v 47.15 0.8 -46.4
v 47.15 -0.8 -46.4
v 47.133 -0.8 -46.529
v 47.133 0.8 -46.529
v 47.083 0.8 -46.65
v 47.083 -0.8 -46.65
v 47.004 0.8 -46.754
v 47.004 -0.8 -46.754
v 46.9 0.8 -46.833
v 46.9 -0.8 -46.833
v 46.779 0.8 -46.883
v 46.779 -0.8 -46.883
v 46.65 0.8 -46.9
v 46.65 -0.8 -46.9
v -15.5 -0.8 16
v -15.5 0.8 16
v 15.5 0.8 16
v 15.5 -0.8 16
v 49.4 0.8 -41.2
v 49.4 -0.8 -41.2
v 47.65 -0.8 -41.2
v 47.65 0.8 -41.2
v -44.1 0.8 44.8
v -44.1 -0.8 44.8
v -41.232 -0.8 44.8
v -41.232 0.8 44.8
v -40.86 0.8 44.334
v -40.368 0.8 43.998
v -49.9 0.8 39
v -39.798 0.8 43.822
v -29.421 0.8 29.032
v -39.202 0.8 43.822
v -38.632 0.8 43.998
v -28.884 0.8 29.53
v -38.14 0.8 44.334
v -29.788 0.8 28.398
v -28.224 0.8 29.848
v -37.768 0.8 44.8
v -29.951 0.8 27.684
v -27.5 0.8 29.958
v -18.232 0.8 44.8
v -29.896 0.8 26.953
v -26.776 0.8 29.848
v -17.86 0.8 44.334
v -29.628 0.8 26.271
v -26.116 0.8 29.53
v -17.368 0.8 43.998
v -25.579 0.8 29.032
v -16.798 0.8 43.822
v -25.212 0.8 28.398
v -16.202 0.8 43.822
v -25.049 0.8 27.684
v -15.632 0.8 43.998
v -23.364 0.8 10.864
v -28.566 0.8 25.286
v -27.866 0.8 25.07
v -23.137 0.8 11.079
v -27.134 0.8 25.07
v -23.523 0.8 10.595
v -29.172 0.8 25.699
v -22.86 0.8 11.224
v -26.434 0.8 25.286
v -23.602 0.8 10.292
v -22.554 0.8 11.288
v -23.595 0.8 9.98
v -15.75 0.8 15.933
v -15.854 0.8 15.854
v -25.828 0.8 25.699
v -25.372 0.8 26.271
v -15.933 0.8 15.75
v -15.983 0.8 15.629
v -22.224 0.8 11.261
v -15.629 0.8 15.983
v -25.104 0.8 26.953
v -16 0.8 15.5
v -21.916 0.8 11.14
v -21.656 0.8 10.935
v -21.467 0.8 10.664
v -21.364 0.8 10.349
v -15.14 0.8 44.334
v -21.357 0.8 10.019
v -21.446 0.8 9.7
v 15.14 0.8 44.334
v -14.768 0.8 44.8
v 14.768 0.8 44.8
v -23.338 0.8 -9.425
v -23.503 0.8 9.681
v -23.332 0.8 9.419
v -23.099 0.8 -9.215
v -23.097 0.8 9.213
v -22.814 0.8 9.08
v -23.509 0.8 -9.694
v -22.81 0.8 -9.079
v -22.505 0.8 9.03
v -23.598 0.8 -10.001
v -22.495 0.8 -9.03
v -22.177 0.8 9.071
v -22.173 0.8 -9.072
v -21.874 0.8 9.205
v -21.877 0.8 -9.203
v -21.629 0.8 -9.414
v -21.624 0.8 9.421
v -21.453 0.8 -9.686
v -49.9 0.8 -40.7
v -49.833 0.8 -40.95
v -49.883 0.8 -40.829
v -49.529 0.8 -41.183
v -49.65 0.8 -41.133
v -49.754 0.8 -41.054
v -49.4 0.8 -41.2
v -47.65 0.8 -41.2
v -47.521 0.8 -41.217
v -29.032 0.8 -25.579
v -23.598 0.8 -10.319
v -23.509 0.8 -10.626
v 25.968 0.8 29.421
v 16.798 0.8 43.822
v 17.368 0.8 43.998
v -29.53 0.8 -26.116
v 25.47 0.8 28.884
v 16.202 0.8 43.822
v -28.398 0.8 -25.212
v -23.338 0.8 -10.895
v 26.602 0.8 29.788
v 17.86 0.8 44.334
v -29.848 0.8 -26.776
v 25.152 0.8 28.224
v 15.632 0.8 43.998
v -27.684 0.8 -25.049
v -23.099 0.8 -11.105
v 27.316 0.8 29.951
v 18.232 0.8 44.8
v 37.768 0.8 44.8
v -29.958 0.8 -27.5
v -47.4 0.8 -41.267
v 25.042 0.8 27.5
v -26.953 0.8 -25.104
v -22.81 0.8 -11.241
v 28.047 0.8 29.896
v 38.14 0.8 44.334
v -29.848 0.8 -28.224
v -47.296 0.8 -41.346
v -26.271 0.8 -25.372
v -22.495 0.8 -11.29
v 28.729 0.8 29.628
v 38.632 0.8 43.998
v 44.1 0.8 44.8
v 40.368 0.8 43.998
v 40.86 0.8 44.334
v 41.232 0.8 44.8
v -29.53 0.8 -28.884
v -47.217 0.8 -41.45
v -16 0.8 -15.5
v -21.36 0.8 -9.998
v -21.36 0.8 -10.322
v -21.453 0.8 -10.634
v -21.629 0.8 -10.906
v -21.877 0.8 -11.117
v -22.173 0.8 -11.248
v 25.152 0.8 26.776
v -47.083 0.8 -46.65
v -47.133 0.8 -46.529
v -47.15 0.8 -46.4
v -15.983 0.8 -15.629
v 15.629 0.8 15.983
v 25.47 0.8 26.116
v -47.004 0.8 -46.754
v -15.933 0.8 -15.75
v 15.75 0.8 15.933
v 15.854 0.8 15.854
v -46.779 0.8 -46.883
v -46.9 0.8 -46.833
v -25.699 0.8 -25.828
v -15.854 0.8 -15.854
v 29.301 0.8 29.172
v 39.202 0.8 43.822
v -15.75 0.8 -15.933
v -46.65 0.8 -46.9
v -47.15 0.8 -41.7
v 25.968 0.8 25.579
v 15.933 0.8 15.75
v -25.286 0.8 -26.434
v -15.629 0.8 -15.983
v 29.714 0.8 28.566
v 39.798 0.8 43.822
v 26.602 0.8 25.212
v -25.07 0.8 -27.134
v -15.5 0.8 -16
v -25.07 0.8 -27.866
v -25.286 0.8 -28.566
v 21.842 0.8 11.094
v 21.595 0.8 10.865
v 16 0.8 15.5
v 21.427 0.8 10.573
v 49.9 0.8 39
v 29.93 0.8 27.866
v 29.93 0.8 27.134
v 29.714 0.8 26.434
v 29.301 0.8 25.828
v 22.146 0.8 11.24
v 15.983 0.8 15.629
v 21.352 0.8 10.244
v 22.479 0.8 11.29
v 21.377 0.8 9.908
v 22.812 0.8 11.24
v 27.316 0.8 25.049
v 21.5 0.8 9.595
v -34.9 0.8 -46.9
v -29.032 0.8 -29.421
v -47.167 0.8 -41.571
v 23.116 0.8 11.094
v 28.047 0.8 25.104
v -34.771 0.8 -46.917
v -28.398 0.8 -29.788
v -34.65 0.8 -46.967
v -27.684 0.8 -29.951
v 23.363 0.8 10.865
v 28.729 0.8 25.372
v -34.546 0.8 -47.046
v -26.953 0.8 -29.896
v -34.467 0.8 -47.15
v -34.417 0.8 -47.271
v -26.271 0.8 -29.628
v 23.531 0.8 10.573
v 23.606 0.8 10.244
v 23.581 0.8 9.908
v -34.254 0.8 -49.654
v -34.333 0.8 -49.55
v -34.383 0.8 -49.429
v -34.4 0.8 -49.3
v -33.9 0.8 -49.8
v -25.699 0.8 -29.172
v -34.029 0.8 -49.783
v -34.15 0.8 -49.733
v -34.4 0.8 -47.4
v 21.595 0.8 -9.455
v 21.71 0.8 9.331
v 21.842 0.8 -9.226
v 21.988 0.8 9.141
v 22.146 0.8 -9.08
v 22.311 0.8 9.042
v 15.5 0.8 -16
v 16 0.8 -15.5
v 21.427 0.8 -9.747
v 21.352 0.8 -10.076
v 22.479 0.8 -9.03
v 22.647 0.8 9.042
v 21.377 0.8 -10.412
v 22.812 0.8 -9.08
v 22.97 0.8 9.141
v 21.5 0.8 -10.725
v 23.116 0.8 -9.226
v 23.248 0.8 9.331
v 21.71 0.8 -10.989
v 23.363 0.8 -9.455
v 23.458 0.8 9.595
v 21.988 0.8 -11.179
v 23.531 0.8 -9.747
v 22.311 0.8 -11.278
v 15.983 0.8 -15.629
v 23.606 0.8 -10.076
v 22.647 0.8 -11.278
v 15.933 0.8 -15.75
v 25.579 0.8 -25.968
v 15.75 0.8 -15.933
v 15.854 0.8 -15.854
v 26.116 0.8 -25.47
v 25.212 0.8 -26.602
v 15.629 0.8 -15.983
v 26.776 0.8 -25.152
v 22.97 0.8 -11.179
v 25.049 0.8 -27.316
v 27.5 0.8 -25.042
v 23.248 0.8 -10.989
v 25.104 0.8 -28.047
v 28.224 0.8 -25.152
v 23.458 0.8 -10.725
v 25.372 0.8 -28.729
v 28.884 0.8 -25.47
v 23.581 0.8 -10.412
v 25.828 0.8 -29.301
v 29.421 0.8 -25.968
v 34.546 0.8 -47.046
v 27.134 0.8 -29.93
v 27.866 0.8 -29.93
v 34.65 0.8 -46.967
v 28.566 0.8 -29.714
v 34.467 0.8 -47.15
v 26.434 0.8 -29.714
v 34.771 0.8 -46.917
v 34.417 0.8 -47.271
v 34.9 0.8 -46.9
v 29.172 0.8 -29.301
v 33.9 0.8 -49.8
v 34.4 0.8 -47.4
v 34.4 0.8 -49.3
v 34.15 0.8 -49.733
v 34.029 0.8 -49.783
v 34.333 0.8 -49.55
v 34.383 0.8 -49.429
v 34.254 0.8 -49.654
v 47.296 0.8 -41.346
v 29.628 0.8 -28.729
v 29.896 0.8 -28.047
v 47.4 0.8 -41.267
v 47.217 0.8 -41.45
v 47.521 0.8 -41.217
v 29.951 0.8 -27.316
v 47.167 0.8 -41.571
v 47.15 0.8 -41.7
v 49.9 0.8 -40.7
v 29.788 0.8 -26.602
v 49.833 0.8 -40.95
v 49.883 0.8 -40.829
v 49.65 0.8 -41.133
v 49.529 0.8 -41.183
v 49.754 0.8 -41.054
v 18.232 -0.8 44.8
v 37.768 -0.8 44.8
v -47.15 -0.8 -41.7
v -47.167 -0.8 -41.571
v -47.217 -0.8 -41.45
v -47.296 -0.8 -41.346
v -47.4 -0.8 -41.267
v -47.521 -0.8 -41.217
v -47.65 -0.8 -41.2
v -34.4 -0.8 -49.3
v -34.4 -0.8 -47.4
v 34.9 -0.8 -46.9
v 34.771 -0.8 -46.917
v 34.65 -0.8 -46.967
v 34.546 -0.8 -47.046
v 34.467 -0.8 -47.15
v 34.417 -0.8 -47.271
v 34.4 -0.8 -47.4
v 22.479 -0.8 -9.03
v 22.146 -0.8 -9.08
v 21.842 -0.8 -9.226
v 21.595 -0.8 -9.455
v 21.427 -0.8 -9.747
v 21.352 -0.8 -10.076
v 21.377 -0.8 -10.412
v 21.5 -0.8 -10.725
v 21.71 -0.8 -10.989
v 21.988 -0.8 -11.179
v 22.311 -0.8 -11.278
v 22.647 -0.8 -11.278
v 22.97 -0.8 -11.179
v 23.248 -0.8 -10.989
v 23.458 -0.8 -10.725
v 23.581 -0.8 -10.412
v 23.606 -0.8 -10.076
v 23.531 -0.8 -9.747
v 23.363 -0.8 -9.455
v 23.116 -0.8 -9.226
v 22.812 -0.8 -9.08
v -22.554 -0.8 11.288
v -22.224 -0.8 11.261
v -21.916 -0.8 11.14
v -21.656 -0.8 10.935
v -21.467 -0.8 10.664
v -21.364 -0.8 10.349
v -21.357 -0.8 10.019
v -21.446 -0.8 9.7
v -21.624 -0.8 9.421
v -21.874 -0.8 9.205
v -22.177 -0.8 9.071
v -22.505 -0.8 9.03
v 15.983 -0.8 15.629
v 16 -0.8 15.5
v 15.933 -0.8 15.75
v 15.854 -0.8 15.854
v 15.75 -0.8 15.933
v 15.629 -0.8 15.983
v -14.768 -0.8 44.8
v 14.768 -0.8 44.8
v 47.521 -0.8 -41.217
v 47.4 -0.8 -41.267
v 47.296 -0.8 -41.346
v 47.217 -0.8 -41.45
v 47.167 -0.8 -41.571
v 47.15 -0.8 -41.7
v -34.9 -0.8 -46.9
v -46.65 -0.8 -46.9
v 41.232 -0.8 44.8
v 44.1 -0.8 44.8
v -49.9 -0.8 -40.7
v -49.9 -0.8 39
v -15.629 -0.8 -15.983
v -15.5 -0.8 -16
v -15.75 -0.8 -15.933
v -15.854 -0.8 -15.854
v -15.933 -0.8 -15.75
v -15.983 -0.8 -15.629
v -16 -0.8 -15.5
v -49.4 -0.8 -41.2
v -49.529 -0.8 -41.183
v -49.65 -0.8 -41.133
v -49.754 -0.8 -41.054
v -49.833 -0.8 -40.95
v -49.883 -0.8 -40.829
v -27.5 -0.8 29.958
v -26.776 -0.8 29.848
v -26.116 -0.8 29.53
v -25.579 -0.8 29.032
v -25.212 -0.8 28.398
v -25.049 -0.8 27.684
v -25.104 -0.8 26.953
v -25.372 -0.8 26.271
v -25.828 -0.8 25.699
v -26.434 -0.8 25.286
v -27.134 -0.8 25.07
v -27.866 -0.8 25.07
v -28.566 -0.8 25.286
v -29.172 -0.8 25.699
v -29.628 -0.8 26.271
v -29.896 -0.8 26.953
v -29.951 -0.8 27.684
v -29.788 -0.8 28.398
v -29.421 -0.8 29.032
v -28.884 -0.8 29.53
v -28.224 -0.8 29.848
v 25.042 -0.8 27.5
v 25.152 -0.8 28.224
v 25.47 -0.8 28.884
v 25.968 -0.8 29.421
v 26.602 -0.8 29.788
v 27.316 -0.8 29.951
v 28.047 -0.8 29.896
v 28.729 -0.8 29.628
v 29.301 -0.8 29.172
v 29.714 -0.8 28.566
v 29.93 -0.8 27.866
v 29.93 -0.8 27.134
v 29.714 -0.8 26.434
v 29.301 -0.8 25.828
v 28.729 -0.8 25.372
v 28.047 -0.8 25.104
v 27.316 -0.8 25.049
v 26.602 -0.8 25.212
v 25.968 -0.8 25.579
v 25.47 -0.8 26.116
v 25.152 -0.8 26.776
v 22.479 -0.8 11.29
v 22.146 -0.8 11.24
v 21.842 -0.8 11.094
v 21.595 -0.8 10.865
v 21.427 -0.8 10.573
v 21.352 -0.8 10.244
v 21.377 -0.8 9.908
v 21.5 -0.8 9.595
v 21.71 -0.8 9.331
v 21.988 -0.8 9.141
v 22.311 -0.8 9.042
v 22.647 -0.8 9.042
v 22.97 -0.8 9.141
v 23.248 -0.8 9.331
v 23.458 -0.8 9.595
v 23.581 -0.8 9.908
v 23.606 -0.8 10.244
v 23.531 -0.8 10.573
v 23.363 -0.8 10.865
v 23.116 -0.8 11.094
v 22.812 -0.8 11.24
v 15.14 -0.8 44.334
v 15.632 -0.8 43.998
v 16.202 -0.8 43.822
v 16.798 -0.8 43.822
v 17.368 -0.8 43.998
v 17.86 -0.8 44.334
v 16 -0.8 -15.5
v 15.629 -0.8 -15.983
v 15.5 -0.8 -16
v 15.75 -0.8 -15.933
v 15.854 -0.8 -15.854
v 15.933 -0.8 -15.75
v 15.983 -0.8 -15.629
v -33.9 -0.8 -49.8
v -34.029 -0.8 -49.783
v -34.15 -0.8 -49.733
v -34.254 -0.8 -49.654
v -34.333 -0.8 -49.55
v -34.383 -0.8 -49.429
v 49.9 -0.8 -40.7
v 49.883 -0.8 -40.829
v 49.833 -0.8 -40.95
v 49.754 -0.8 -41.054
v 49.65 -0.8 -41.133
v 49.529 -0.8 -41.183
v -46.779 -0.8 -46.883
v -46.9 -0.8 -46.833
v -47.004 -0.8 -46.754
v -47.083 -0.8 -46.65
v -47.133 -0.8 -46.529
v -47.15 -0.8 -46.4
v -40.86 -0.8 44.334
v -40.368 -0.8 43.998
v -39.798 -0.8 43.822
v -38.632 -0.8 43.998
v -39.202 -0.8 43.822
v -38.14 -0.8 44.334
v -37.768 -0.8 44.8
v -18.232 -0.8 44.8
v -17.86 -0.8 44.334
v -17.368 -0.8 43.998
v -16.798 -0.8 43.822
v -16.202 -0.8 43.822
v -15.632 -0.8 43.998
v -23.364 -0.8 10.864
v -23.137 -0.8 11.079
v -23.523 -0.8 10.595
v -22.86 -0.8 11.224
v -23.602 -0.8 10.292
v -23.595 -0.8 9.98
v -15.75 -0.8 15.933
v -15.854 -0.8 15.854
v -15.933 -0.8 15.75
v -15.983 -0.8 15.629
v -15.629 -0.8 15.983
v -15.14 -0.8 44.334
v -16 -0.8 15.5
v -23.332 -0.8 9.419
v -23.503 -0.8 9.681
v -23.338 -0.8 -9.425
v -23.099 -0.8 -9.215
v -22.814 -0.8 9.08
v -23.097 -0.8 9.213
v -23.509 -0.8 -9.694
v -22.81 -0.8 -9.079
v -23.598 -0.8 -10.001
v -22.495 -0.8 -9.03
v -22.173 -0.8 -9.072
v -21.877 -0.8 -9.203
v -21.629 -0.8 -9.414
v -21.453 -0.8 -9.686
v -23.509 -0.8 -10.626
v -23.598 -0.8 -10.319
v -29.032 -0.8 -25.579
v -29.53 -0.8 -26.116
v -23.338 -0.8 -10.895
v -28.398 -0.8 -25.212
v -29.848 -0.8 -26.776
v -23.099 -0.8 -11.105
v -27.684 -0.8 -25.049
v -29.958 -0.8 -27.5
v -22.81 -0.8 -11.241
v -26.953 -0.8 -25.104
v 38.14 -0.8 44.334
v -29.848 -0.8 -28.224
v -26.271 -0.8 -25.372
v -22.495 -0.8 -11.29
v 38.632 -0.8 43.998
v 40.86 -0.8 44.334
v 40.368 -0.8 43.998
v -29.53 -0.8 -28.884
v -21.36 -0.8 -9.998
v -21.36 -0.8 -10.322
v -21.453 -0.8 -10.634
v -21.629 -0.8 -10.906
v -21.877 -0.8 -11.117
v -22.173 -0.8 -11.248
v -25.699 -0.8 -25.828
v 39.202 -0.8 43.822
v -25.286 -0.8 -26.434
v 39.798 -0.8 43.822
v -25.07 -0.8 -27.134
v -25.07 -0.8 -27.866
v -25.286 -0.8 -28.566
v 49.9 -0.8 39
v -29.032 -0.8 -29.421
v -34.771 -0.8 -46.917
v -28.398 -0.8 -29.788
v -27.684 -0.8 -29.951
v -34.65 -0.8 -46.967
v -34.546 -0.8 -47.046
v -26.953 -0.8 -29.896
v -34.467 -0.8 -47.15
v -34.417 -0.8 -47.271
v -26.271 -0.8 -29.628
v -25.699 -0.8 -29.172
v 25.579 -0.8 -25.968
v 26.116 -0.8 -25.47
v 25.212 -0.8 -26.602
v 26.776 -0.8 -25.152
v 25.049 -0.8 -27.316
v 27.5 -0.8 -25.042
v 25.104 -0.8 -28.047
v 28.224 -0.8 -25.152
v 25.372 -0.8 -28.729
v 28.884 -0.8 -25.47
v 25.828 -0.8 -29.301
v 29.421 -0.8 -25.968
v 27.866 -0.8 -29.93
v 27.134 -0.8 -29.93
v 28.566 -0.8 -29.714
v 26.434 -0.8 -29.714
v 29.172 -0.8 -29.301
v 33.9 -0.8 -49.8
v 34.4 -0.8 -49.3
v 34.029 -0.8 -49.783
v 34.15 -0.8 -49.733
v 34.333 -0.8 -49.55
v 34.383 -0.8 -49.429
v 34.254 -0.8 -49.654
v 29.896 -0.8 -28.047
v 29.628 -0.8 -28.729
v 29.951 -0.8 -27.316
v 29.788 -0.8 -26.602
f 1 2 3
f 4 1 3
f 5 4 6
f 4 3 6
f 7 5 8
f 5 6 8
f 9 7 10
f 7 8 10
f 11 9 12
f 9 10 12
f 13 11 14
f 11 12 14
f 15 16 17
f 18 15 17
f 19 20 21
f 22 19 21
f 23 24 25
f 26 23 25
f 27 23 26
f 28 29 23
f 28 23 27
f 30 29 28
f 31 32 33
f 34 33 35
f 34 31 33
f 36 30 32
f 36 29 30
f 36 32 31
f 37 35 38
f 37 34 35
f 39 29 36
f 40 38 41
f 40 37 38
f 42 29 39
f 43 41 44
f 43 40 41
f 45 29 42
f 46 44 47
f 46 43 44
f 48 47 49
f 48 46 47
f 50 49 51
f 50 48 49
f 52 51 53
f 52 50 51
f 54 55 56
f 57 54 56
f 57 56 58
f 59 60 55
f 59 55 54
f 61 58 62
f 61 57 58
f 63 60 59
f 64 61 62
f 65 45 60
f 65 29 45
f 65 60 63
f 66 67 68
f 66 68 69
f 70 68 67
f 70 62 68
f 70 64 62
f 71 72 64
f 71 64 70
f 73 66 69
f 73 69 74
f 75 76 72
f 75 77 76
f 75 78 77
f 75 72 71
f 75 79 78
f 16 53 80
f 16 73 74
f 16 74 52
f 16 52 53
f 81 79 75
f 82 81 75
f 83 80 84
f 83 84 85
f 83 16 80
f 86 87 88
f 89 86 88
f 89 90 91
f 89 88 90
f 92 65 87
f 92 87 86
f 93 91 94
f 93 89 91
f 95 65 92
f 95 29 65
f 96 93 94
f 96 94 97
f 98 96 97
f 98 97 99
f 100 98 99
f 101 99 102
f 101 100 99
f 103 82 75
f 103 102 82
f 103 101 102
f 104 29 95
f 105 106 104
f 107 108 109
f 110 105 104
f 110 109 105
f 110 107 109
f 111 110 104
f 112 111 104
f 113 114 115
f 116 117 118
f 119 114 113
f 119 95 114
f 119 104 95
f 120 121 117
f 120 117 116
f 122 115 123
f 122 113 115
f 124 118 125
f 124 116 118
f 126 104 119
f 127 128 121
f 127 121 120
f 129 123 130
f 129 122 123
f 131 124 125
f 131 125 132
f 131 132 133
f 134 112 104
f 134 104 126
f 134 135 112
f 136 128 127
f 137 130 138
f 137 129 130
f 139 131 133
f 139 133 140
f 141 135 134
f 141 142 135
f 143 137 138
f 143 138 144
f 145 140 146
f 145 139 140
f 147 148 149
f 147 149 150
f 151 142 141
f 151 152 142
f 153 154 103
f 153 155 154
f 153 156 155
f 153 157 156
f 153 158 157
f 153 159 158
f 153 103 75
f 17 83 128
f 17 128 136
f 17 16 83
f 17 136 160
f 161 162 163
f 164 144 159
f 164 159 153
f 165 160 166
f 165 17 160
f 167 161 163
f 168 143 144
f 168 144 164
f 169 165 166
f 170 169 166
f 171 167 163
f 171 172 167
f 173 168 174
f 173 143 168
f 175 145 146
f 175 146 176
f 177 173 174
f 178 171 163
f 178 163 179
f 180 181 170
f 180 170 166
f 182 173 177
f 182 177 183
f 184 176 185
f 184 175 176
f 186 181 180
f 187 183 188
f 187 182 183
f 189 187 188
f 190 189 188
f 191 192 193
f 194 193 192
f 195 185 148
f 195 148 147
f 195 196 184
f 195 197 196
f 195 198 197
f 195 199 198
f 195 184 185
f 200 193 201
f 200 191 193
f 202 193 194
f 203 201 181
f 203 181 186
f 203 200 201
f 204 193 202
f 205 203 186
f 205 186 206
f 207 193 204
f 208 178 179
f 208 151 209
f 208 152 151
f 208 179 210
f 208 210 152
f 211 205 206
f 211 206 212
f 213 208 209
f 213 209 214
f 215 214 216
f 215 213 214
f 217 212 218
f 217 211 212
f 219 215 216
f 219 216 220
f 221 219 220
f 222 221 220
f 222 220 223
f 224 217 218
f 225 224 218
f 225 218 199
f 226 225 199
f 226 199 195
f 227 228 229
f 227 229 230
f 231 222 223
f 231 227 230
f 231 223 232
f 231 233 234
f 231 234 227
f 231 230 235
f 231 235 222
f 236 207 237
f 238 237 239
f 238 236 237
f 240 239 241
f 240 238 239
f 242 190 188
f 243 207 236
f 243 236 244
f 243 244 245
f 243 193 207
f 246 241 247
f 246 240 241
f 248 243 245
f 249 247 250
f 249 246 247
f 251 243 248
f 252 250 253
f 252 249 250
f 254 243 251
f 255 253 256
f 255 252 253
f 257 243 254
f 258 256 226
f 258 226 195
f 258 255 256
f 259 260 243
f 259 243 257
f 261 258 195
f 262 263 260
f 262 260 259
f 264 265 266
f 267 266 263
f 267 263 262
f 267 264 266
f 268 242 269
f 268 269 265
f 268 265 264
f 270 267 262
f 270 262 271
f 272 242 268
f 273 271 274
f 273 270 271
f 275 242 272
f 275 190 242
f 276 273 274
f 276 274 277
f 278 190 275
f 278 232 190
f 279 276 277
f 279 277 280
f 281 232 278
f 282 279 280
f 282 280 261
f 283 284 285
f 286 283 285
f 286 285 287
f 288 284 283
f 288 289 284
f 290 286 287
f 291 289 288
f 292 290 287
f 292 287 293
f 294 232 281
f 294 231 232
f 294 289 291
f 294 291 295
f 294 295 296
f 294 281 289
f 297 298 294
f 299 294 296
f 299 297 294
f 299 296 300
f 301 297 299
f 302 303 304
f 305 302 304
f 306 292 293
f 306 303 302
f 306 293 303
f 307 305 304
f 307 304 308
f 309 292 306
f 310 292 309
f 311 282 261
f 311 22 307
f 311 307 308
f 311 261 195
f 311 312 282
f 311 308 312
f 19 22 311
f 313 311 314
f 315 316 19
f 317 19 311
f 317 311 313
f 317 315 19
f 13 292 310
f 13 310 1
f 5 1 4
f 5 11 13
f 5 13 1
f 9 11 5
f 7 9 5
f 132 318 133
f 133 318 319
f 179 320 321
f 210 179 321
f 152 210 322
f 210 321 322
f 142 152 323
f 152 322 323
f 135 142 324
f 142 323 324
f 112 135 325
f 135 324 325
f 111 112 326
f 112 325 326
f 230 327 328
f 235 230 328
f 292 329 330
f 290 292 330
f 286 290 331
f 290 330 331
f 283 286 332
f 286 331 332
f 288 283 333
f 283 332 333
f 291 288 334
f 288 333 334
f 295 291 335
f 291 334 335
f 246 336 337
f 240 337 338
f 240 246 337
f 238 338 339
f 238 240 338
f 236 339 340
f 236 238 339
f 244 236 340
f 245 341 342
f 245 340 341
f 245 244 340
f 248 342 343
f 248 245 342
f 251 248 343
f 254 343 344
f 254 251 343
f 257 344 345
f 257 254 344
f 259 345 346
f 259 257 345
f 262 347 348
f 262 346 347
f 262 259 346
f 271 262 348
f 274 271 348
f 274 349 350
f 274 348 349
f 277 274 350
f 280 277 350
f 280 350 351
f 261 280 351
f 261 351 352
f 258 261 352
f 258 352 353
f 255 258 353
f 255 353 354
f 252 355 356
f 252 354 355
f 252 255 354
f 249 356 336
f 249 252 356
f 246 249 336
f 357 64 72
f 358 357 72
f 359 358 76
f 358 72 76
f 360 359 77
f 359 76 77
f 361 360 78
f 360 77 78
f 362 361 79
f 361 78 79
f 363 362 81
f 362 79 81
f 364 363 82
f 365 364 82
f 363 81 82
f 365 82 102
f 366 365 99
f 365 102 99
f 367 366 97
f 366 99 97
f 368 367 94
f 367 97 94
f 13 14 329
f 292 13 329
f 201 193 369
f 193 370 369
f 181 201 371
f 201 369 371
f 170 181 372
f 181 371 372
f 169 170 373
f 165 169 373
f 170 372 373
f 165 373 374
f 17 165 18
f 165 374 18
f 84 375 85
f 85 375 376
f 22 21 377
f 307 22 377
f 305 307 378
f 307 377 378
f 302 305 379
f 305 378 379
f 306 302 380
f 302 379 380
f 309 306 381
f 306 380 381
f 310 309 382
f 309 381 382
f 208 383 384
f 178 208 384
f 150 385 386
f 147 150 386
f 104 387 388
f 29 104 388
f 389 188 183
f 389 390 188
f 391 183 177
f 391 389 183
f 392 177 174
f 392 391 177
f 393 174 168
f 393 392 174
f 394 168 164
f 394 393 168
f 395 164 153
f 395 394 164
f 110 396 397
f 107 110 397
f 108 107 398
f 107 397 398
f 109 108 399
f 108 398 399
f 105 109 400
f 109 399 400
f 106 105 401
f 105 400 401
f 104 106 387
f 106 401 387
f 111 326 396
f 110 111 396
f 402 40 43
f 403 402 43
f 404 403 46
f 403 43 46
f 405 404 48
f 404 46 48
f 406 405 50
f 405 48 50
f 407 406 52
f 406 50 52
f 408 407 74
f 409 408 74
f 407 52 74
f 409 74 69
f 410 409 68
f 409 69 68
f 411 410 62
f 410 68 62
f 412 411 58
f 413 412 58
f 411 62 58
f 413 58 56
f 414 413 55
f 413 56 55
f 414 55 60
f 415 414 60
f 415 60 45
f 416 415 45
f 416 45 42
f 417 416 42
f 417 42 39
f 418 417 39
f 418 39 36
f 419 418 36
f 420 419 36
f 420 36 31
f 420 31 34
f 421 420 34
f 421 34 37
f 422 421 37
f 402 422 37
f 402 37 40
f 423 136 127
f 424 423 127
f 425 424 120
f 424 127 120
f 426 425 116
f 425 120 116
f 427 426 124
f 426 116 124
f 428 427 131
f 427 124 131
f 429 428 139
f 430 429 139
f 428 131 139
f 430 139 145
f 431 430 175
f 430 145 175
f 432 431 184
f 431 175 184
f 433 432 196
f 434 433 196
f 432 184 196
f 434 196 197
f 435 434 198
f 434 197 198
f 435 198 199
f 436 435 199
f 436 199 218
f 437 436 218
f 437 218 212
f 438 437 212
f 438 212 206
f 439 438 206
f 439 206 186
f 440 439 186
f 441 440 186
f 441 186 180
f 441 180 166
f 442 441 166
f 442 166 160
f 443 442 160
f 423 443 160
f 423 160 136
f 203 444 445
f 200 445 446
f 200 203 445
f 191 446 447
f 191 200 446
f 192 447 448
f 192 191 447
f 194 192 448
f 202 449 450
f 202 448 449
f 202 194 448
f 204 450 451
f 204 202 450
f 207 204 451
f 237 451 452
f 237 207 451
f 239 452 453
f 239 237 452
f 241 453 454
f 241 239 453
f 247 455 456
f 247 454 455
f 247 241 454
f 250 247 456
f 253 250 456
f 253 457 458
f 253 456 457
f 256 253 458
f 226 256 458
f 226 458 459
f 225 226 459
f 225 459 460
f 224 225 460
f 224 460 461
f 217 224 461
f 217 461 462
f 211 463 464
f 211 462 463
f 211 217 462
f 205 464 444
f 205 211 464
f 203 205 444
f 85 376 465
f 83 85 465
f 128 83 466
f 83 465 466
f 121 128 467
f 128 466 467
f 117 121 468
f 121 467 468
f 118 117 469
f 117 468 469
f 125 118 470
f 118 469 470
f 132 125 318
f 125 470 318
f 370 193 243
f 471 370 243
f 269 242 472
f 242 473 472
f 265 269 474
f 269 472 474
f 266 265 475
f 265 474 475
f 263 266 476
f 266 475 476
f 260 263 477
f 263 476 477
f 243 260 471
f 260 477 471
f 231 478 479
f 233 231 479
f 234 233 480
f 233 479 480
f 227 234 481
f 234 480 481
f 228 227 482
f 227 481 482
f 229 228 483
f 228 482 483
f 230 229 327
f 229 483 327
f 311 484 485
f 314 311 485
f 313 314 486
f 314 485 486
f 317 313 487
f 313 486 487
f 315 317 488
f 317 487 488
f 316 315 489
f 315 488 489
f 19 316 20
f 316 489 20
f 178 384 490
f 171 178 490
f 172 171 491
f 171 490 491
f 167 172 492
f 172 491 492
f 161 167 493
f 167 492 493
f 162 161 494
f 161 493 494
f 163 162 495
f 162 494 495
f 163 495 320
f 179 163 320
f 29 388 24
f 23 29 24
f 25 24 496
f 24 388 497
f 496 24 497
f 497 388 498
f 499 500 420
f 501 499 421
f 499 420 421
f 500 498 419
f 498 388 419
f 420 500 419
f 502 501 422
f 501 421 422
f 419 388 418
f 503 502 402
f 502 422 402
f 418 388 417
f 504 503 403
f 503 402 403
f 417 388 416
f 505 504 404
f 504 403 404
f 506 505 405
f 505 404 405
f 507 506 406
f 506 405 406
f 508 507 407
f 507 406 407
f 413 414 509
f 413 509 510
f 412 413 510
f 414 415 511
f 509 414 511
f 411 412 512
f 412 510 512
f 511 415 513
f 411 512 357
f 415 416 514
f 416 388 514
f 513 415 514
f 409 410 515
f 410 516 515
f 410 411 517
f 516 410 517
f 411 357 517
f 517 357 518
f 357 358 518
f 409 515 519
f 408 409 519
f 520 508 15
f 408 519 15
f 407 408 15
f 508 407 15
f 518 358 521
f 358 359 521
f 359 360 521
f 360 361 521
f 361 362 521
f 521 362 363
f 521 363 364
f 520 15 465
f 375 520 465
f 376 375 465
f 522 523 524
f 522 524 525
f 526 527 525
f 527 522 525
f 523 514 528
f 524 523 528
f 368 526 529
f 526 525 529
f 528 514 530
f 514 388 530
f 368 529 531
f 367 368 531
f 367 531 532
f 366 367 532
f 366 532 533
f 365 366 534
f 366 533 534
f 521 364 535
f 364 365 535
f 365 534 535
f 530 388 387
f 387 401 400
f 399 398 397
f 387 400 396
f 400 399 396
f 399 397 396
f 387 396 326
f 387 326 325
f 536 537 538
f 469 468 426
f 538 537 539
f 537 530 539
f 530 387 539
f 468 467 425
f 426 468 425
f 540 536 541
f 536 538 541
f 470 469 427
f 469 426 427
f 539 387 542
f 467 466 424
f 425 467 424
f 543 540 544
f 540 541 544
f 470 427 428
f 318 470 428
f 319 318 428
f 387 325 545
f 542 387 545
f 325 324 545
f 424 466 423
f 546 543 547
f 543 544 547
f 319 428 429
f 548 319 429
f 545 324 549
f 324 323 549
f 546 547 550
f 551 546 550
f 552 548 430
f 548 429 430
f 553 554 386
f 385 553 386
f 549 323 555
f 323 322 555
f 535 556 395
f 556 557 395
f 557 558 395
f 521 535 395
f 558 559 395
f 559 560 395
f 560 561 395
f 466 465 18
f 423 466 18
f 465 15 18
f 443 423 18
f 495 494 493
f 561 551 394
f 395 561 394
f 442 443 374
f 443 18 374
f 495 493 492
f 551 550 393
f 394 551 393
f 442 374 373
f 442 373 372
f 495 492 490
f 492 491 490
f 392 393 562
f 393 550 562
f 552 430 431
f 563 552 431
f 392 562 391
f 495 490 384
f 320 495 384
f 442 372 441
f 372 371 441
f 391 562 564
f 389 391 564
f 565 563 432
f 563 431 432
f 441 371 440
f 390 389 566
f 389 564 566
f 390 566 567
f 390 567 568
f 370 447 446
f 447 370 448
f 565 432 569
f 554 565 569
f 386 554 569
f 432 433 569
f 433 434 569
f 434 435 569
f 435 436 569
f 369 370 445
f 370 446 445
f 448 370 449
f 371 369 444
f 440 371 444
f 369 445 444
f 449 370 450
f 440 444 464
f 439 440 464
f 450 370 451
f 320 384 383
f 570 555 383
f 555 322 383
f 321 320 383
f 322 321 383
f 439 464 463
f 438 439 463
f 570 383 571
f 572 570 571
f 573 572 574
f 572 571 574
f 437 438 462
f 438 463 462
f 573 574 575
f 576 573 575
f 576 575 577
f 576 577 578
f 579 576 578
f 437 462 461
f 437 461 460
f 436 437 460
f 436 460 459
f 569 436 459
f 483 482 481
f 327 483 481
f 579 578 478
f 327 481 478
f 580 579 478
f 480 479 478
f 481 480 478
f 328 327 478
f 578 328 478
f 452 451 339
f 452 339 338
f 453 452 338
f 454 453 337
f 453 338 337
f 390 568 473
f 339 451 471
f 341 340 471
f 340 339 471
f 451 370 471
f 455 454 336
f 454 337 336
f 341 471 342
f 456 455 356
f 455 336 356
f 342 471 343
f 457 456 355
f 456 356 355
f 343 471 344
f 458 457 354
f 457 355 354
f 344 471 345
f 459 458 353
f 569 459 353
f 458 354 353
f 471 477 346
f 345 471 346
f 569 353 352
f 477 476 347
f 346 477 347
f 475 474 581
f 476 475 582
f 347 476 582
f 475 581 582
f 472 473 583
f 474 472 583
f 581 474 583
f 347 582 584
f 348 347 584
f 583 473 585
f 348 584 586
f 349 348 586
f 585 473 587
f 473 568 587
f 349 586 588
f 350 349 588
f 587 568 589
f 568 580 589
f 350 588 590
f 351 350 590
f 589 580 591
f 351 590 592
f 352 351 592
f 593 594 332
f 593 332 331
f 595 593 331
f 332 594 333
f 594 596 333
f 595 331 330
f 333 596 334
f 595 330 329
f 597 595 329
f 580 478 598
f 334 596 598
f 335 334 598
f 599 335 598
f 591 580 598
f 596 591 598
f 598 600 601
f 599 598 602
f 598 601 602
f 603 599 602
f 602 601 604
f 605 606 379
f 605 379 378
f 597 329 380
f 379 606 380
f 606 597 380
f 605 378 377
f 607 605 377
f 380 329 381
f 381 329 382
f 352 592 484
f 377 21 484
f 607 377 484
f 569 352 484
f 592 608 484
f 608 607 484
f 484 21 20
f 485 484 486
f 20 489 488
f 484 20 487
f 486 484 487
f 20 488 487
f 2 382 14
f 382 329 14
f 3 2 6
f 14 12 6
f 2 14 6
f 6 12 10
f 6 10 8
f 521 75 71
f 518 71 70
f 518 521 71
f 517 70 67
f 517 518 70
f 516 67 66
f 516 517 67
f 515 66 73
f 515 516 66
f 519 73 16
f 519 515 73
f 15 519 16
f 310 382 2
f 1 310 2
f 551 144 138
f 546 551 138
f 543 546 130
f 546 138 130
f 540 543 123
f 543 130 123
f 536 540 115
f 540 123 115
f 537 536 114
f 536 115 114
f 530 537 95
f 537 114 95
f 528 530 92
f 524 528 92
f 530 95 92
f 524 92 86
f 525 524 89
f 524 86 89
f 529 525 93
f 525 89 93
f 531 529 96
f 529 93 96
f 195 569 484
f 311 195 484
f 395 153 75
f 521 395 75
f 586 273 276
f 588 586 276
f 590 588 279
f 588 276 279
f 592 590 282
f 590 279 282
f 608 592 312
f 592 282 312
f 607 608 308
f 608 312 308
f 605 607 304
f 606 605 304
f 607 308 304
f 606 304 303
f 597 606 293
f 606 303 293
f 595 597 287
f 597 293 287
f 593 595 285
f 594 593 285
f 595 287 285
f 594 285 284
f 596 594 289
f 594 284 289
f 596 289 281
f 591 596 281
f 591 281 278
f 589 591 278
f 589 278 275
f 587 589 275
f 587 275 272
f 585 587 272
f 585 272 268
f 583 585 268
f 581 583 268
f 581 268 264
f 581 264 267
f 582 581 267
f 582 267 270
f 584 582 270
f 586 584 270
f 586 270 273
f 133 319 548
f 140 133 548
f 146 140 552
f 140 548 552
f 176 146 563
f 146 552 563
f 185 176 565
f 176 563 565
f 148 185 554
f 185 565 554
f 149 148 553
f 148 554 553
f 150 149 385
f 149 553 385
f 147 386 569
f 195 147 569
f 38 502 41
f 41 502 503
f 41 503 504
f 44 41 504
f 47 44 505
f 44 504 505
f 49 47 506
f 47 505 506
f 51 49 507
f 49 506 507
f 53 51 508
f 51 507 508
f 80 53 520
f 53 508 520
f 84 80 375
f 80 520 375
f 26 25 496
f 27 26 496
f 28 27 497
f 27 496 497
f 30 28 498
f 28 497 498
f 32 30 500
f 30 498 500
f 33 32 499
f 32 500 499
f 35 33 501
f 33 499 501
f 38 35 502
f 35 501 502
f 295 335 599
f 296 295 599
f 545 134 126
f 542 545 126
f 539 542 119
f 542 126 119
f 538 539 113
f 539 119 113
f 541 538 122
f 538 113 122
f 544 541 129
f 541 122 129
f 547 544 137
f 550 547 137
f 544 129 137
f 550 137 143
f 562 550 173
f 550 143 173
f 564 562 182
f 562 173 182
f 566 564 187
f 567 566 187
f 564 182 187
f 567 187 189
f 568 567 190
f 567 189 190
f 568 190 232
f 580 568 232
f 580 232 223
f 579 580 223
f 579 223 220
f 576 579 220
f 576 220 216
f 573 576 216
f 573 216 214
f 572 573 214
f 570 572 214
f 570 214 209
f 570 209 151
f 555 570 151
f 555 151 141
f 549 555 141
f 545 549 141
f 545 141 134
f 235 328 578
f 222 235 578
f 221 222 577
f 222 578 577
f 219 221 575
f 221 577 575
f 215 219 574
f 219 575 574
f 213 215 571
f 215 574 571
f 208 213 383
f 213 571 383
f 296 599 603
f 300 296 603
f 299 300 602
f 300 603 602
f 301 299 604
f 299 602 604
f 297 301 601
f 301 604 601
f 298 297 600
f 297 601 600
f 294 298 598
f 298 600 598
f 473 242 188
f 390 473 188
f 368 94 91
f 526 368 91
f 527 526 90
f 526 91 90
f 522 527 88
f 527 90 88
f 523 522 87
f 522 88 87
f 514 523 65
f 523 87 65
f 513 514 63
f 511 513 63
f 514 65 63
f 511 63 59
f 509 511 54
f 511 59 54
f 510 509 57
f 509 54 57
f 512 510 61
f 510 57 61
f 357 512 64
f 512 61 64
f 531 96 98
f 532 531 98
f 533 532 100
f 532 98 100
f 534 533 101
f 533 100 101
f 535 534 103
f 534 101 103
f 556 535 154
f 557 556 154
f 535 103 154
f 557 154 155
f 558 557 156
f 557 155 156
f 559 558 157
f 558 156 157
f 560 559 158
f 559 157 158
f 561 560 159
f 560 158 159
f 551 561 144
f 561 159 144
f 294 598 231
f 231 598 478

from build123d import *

# Parameters (mm, degrees)
GENERICCARDPCBDEFINITION_START = -0.8
GENERICCARDPCBDEFINITION_DEPTH = 1.6
CUT_EXTRUDE1_REACH             = 72.517
CUT_EXTRUDE2_REACH             = 72.517
SKETCH8_R                      = 2.4575
FILLET1_R                      = 0.5


# Read off the part's stored shape, not the designer's step: GenericCardPCBDefinition
with BuildPart() as part:
    # GenericCardPCBDefinition outline → GenericCardPCBDefinition (new body)
    with BuildSketch(Plane(origin=(0, 0, 0), x_dir=(1, 0, 0), z_dir=(0, 1, 0)).offset(GENERICCARDPCBDEFINITION_START)):
        with BuildLine():
            Line((-49.9, -39), (-44.1, -44.8))
            Line((-44.1, -44.8), (-41.232050808, -44.8))
            ThreePointArc((-41.232050808, -44.8), (-39.5, -43.8), (-37.767949192, -44.8))
            Line((-37.767949192, -44.8), (-18.232050808, -44.8))
            ThreePointArc((-18.232050808, -44.8), (-16.5, -43.8), (-14.767949192, -44.8))
            Line((-14.767949192, -44.8), (14.767949192, -44.8))
            ThreePointArc((14.767949192, -44.8), (16.5, -43.8), (18.232050808, -44.8))
            Line((18.232050808, -44.8), (37.767949192, -44.8))
            ThreePointArc((37.767949192, -44.8), (39.5, -43.8), (41.232050808, -44.8))
            Line((41.232050808, -44.8), (44.1, -44.8))
            Line((44.1, -44.8), (49.9, -39))
            Line((49.9, -39), (49.9, 40.7))
            ThreePointArc((49.9, 40.7), (49.753553391, 41.053553391), (49.4, 41.2))
            Line((49.4, 41.2), (47.65, 41.2))
            ThreePointArc((47.65, 41.2), (47.296446609, 41.346446609), (47.15, 41.7))
            Line((47.15, 41.7), (47.15, 46.4))
            ThreePointArc((47.15, 46.4), (47.003553391, 46.753553391), (46.65, 46.9))
            Line((46.65, 46.9), (34.9, 46.9))
            ThreePointArc((34.9, 46.9), (34.546446609, 47.046446609), (34.4, 47.4))
            Line((34.4, 47.4), (34.4, 49.3))
            ThreePointArc((34.4, 49.3), (34.253553391, 49.653553391), (33.9, 49.8))
            Line((33.9, 49.8), (-33.9, 49.8))
            ThreePointArc((-33.9, 49.8), (-34.253553391, 49.653553391), (-34.4, 49.3))
            Line((-34.4, 49.3), (-34.4, 47.4))
            ThreePointArc((-34.4, 47.4), (-34.546446609, 47.046446609), (-34.9, 46.9))
            Line((-34.9, 46.9), (-46.65, 46.9))
            ThreePointArc((-46.65, 46.9), (-47.003553391, 46.753553391), (-47.15, 46.4))
            Line((-47.15, 46.4), (-47.15, 41.7))
            ThreePointArc((-47.15, 41.7), (-47.296446609, 41.346446609), (-47.65, 41.2))
            Line((-47.65, 41.2), (-49.4, 41.2))
            ThreePointArc((-49.4, 41.2), (-49.753553391, 41.053553391), (-49.9, 40.7))
            Line((-49.9, 40.7), (-49.9, -39))
        make_face()
    extrude(amount=GENERICCARDPCBDEFINITION_DEPTH)

    # Sketch7 → Cut-Extrude1 (cut, up to next)
    with BuildSketch(Plane(origin=(0, 0.8, 0), x_dir=(1, 0, 0), z_dir=(0, 1, 0)), mode=Mode.PRIVATE) as cut_extrude1_sk1:
        Polygon((16, 14.5), (16, -14.5), (16, -16), (-14.25, -16), (-14.5, -16), (-16, -16), (-16, -14.5), (-16, 14.5), (-16, 16), (-14.5, 16), (-14.25, 16), (2.7929, 16), (3.75, 16), (16, 16), align=None)
    cut_extrude1_tool1 = extrude(cut_extrude1_sk1.sketch, amount=-CUT_EXTRUDE1_REACH, mode=Mode.PRIVATE) & part.part
    add(cut_extrude1_tool1.solids().sort_by_distance((0, 0.8, 0))[0], mode=Mode.SUBTRACT)

    # Sketch8 → Cut-Extrude2 (cut, up to next)
    with BuildSketch(Plane(origin=(0, 0.8, 0), x_dir=(1, 0, 0), z_dir=(0, 1, 0)), mode=Mode.PRIVATE) as cut_extrude2_sk1:
        with Locations(Location((27.5, 27.5, 0), (0, 0, 270))):
            Circle(SKETCH8_R)
    cut_extrude2_tool1 = extrude(cut_extrude2_sk1.sketch, amount=-CUT_EXTRUDE2_REACH, mode=Mode.PRIVATE) & part.part
    # Sketch8 → Cut-Extrude2 (cut, up to next)
    with BuildSketch(Plane(origin=(0, 0.8, 0), x_dir=(1, 0, 0), z_dir=(0, 1, 0)), mode=Mode.PRIVATE) as cut_extrude2_sk2:
        with Locations(Location((-27.5, -27.5, 0), (0, 0, 270))):
            Circle(SKETCH8_R)
    cut_extrude2_tool2 = extrude(cut_extrude2_sk2.sketch, amount=-CUT_EXTRUDE2_REACH, mode=Mode.PRIVATE) & part.part
    # Sketch8 → Cut-Extrude2 (cut, up to next)
    with BuildSketch(Plane(origin=(0, 0.8, 0), x_dir=(1, 0, 0), z_dir=(0, 1, 0)), mode=Mode.PRIVATE) as cut_extrude2_sk3:
        with Locations(Location((27.5, -27.5, 0), (0, 0, 180))):
            Circle(SKETCH8_R)
    cut_extrude2_tool3 = extrude(cut_extrude2_sk3.sketch, amount=-CUT_EXTRUDE2_REACH, mode=Mode.PRIVATE) & part.part
    # Sketch8 → Cut-Extrude2 (cut, up to next)
    with BuildSketch(Plane(origin=(0, 0.8, 0), x_dir=(1, 0, 0), z_dir=(0, 1, 0)), mode=Mode.PRIVATE) as cut_extrude2_sk4:
        with Locations(Location((-27.5, 27.5, 0), (0, 0, 180))):
            Circle(SKETCH8_R)
    cut_extrude2_tool4 = extrude(cut_extrude2_sk4.sketch, amount=-CUT_EXTRUDE2_REACH, mode=Mode.PRIVATE) & part.part
    # Sketch8 → Cut-Extrude2 (cut, up to next)
    with BuildSketch(Plane(origin=(0, 0.8, 0), x_dir=(1, 0, 0), z_dir=(0, 1, 0)), mode=Mode.PRIVATE) as cut_extrude2_sk5:
        with BuildLine():
            ThreePointArc((-22.495277655, 11.290382806), (-23.6095, 10.16), (-22.495277655, 9.029617194))
            ThreePointArc((-22.495277655, 9.029617194), (-21.3485, 10.16), (-22.495277655, 11.290382806))
        make_face()
    cut_extrude2_tool5 = extrude(cut_extrude2_sk5.sketch, amount=-CUT_EXTRUDE2_REACH, mode=Mode.PRIVATE) & part.part
    # Sketch8 → Cut-Extrude2 (cut, up to next)
    with BuildSketch(Plane(origin=(0, 0.8, 0), x_dir=(1, 0, 0), z_dir=(0, 1, 0)), mode=Mode.PRIVATE) as cut_extrude2_sk6:
        with BuildLine():
            ThreePointArc((-22.504884895, -9.02979638), (-23.609238096, -10.135666951), (-22.553502979, -11.288042356))
            ThreePointArc((-22.553502979, -11.288042356), (-21.348761904, -10.184333049), (-22.504884895, -9.02979638))
        make_face()
    cut_extrude2_tool6 = extrude(cut_extrude2_sk6.sketch, amount=-CUT_EXTRUDE2_REACH, mode=Mode.PRIVATE) & part.part
    # Sketch8 → Cut-Extrude2 (cut, up to next)
    with BuildSketch(Plane(origin=(0, 0.8, 0), x_dir=(1, 0, 0), z_dir=(0, 1, 0)), mode=Mode.PRIVATE) as cut_extrude2_sk7:
        with BuildLine():
            ThreePointArc((22.479, 11.2905), (23.6095, 10.16), (22.479, 9.0295))
            ThreePointArc((22.479, 9.0295), (21.3485, 10.16), (22.479, 11.2905))
        make_face()
    cut_extrude2_tool7 = extrude(cut_extrude2_sk7.sketch, amount=-CUT_EXTRUDE2_REACH, mode=Mode.PRIVATE) & part.part
    # Sketch8 → Cut-Extrude2 (cut, up to next)
    with BuildSketch(Plane(origin=(0, 0.8, 0), x_dir=(1, 0, 0), z_dir=(0, 1, 0)), mode=Mode.PRIVATE) as cut_extrude2_sk8:
        with BuildLine():
            ThreePointArc((22.479, -9.0295), (23.6095, -10.16), (22.479, -11.2905))
            ThreePointArc((22.479, -11.2905), (21.3485, -10.16), (22.479, -9.0295))
        make_face()
    cut_extrude2_tool8 = extrude(cut_extrude2_sk8.sketch, amount=-CUT_EXTRUDE2_REACH, mode=Mode.PRIVATE) & part.part
    add(cut_extrude2_tool1.solids().sort_by_distance((27.5, 0.8, -27.5))[0], mode=Mode.SUBTRACT)
    add(cut_extrude2_tool2.solids().sort_by_distance((-27.5, 0.8, 27.5))[0], mode=Mode.SUBTRACT)
    add(cut_extrude2_tool3.solids().sort_by_distance((27.5, 0.8, 27.5))[0], mode=Mode.SUBTRACT)
    add(cut_extrude2_tool4.solids().sort_by_distance((-27.5, 0.8, -27.5))[0], mode=Mode.SUBTRACT)
    add(cut_extrude2_tool5.solids().sort_by_distance((-22.479, 0.8, -10.16))[0], mode=Mode.SUBTRACT)
    add(cut_extrude2_tool6.solids().sort_by_distance((-22.479, 0.8, 10.16))[0], mode=Mode.SUBTRACT)
    add(cut_extrude2_tool7.solids().sort_by_distance((22.479, 0.8, -10.16))[0], mode=Mode.SUBTRACT)
    add(cut_extrude2_tool8.solids().sort_by_distance((22.479, 0.8, 10.16))[0], mode=Mode.SUBTRACT)

    # Fillet1
    fillet1_edges = [part.edges().sort_by_distance(p)[0] for p in [
        (16, 0, -16),
        (16, 0, 16),
        (-16, 0, 16),
        (-16, 0, -16),
    ]]
    fillet(fillet1_edges, radius=FILLET1_R)


solid = part.part
